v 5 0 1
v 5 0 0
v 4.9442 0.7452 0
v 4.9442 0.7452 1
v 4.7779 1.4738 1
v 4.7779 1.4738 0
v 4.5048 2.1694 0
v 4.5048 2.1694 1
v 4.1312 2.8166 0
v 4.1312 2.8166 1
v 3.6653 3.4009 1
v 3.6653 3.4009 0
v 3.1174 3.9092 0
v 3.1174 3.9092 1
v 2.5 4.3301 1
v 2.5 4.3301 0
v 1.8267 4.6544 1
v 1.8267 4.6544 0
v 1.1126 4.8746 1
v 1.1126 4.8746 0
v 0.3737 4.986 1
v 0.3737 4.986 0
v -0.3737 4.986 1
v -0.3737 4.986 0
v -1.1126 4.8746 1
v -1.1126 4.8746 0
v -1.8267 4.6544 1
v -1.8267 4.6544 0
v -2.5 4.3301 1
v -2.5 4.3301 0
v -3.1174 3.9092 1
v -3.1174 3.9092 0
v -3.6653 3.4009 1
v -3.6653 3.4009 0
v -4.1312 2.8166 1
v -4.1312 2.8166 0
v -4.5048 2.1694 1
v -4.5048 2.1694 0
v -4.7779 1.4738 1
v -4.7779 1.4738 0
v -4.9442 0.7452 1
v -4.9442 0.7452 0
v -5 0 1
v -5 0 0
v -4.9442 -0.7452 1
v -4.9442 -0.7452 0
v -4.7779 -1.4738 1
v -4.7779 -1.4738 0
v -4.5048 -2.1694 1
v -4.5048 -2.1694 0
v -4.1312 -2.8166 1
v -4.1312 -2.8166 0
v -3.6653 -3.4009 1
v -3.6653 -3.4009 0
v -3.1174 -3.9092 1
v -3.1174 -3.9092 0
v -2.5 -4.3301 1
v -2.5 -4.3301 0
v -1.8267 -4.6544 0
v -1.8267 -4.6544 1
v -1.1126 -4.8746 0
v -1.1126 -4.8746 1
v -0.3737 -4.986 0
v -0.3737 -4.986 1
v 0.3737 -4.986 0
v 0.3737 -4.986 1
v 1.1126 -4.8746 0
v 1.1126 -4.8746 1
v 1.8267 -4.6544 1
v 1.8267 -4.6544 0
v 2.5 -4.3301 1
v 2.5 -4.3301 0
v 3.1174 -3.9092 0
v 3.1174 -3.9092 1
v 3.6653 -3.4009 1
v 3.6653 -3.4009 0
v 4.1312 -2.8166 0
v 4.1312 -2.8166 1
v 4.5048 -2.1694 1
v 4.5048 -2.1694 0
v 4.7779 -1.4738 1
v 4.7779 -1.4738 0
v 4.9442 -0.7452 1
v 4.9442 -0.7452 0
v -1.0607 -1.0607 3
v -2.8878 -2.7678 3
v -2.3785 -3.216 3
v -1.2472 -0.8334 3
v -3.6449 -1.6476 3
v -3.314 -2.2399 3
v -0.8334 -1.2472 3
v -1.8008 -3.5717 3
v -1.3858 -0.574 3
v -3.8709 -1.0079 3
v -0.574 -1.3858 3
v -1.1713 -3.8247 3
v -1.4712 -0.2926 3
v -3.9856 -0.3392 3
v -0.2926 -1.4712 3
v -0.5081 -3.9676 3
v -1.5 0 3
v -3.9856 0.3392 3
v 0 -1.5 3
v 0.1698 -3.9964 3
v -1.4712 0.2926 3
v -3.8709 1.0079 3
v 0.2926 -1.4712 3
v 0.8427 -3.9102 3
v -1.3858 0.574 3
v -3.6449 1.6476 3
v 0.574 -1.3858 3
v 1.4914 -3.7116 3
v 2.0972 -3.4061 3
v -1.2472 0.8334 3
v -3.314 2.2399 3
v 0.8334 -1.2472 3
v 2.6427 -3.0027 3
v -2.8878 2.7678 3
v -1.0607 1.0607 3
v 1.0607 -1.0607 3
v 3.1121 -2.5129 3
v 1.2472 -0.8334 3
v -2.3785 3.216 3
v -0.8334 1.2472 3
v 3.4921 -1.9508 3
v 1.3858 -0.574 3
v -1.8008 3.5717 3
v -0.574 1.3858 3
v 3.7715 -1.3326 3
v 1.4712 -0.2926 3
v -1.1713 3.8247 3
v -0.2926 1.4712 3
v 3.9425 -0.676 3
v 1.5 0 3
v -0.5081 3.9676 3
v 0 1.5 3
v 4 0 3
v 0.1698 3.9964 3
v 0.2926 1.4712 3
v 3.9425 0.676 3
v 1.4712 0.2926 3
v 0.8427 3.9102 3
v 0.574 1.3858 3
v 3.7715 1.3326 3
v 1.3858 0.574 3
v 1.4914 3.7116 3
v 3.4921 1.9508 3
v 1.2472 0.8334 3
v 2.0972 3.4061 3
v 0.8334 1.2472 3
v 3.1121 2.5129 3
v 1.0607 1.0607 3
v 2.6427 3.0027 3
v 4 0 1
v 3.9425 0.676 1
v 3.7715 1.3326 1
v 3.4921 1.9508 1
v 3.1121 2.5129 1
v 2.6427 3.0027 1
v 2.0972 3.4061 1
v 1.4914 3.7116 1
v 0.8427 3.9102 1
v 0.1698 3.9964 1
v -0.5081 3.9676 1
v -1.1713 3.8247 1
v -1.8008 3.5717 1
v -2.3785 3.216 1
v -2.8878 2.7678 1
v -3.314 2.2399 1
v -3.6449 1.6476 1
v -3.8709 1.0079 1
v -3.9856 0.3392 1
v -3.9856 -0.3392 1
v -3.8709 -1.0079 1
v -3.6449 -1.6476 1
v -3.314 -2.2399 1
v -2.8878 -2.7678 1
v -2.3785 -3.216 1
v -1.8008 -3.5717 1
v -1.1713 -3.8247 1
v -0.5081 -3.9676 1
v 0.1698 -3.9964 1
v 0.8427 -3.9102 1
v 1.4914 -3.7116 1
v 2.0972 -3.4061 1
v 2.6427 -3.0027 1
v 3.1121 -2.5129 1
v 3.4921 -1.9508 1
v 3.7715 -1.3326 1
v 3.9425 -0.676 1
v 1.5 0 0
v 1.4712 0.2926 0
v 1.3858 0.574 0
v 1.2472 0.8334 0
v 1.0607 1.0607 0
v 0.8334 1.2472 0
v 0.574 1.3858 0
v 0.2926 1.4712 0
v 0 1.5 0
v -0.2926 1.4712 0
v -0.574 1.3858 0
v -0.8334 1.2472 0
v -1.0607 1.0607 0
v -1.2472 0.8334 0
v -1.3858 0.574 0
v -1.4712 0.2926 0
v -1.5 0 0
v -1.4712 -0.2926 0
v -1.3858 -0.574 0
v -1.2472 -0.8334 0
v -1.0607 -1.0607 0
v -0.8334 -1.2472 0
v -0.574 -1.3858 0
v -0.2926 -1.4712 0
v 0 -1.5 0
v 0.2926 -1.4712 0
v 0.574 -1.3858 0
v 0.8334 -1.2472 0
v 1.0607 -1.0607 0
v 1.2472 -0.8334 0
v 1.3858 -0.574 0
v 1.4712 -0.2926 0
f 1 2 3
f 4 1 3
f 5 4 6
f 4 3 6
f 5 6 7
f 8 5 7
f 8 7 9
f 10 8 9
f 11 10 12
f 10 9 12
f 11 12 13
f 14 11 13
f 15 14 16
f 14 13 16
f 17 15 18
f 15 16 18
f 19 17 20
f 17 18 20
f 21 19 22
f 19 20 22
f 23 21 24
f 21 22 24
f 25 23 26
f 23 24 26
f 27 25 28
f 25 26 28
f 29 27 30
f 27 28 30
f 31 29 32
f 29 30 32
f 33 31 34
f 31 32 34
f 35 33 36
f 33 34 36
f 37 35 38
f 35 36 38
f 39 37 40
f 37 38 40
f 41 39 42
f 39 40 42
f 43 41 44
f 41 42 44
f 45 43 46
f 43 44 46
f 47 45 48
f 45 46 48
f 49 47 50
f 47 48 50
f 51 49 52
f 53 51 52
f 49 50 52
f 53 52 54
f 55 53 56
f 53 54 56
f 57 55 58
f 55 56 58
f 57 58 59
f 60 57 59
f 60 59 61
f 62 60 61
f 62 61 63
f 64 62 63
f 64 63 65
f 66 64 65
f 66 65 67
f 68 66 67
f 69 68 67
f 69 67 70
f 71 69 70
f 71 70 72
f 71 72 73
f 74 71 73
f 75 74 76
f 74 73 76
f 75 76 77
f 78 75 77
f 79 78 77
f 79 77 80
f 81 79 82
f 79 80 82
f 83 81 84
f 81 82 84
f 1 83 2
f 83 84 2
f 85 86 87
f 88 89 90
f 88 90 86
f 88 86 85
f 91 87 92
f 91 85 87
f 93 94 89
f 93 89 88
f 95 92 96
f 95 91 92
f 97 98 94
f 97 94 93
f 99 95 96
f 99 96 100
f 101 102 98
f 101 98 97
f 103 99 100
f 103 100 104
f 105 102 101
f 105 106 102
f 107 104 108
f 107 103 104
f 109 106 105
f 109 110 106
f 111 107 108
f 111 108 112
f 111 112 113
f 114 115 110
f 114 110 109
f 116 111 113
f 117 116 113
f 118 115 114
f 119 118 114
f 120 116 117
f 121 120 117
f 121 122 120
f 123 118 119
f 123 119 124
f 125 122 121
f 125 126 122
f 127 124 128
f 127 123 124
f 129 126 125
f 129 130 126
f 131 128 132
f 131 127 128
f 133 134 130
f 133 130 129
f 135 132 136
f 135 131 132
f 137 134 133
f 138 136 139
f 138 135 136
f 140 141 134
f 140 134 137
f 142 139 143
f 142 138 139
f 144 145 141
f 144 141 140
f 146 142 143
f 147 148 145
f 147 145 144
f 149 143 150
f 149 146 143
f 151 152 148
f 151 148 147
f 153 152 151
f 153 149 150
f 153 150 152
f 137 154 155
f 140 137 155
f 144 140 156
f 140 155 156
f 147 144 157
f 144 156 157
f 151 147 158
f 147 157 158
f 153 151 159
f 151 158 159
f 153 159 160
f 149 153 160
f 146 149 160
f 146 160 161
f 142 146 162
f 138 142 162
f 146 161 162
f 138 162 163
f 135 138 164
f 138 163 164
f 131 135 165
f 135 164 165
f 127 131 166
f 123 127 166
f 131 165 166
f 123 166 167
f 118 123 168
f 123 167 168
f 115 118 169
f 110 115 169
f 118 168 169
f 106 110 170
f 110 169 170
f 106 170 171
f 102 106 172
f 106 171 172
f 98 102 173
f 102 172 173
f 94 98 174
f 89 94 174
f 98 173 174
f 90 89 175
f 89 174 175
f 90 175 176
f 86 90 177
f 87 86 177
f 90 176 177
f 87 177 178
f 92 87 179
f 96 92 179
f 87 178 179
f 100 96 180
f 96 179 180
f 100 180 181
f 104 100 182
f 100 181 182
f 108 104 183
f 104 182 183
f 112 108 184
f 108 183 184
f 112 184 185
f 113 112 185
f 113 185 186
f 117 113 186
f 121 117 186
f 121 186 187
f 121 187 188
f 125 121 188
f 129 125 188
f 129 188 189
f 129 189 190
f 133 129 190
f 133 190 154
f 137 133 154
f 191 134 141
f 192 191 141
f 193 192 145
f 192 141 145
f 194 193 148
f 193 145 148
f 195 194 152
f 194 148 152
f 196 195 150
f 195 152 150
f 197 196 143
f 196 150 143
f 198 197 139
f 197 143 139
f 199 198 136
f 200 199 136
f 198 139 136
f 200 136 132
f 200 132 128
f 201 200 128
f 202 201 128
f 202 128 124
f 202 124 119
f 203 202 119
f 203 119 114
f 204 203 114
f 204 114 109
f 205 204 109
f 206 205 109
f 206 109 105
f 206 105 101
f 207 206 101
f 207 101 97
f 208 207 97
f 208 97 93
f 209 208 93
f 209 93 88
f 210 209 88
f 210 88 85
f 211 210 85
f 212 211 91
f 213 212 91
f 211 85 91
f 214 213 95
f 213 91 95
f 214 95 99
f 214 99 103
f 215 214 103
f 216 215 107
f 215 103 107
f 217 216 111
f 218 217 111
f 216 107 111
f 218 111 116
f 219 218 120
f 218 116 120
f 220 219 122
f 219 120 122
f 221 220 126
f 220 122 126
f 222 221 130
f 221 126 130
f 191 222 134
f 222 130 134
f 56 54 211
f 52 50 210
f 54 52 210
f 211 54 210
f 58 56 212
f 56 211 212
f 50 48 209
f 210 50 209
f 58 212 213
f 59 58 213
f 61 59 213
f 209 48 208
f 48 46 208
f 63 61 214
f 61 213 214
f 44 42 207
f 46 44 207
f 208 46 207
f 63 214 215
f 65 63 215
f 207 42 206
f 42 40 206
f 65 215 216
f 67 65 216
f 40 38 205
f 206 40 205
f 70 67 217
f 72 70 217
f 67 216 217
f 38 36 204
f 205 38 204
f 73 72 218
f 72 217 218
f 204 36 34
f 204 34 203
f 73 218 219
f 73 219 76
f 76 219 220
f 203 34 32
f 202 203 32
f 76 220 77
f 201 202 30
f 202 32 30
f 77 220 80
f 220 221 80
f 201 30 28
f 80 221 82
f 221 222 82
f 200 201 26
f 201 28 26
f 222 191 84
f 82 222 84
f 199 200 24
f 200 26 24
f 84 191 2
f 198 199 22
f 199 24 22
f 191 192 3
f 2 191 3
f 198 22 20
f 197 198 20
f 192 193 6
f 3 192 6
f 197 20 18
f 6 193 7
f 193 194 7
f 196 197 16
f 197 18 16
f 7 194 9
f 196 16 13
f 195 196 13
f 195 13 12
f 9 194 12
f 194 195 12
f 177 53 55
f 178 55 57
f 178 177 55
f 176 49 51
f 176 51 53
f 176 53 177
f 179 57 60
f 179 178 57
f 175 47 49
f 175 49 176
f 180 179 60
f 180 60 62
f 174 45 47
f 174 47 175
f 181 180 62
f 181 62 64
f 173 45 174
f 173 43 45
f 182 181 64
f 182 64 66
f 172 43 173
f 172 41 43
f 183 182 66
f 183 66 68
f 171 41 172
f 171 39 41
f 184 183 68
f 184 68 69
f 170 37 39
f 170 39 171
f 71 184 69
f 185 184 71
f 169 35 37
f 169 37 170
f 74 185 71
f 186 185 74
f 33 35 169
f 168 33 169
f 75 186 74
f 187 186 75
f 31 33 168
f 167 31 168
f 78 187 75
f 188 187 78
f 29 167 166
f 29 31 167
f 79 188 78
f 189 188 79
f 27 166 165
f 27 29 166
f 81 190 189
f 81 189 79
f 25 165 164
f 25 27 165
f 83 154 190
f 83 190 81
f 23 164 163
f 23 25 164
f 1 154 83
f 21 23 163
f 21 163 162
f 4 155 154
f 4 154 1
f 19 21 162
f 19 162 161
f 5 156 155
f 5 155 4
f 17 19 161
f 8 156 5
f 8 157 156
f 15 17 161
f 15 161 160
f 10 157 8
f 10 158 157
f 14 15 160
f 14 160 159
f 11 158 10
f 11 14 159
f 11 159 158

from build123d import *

# Parameters (mm, degrees)
SKETCH_1_R          = 5
SKETCH_1_R_2        = 1.5
EXTRUDE_1_DEPTH     = 1
SKETCH_2_R          = 4
EXTRUDE_2_DEPTH     = 2
SKETCH_3_R          = 1.5
CUT_EXTRUDE_1_DEPTH = 8.681145748


with BuildPart() as part:
    # 스케치1 → 돌출1 (new body)
    with BuildSketch(Plane.XY):
        Circle(SKETCH_1_R)
        Circle(SKETCH_1_R_2, mode=Mode.SUBTRACT)
    extrude(amount=EXTRUDE_1_DEPTH)

    # 스케치2 → 돌출2 (add)
    with BuildSketch(Plane.XY.offset(1)):
        Circle(SKETCH_2_R)
    extrude(amount=EXTRUDE_2_DEPTH)

    # 스케치3 → 컷-돌출1 (cut, through all)
    with BuildSketch(Plane.XY.offset(3)):
        Circle(SKETCH_3_R)
    extrude(amount=-CUT_EXTRUDE_1_DEPTH, mode=Mode.SUBTRACT)


solid = part.part
